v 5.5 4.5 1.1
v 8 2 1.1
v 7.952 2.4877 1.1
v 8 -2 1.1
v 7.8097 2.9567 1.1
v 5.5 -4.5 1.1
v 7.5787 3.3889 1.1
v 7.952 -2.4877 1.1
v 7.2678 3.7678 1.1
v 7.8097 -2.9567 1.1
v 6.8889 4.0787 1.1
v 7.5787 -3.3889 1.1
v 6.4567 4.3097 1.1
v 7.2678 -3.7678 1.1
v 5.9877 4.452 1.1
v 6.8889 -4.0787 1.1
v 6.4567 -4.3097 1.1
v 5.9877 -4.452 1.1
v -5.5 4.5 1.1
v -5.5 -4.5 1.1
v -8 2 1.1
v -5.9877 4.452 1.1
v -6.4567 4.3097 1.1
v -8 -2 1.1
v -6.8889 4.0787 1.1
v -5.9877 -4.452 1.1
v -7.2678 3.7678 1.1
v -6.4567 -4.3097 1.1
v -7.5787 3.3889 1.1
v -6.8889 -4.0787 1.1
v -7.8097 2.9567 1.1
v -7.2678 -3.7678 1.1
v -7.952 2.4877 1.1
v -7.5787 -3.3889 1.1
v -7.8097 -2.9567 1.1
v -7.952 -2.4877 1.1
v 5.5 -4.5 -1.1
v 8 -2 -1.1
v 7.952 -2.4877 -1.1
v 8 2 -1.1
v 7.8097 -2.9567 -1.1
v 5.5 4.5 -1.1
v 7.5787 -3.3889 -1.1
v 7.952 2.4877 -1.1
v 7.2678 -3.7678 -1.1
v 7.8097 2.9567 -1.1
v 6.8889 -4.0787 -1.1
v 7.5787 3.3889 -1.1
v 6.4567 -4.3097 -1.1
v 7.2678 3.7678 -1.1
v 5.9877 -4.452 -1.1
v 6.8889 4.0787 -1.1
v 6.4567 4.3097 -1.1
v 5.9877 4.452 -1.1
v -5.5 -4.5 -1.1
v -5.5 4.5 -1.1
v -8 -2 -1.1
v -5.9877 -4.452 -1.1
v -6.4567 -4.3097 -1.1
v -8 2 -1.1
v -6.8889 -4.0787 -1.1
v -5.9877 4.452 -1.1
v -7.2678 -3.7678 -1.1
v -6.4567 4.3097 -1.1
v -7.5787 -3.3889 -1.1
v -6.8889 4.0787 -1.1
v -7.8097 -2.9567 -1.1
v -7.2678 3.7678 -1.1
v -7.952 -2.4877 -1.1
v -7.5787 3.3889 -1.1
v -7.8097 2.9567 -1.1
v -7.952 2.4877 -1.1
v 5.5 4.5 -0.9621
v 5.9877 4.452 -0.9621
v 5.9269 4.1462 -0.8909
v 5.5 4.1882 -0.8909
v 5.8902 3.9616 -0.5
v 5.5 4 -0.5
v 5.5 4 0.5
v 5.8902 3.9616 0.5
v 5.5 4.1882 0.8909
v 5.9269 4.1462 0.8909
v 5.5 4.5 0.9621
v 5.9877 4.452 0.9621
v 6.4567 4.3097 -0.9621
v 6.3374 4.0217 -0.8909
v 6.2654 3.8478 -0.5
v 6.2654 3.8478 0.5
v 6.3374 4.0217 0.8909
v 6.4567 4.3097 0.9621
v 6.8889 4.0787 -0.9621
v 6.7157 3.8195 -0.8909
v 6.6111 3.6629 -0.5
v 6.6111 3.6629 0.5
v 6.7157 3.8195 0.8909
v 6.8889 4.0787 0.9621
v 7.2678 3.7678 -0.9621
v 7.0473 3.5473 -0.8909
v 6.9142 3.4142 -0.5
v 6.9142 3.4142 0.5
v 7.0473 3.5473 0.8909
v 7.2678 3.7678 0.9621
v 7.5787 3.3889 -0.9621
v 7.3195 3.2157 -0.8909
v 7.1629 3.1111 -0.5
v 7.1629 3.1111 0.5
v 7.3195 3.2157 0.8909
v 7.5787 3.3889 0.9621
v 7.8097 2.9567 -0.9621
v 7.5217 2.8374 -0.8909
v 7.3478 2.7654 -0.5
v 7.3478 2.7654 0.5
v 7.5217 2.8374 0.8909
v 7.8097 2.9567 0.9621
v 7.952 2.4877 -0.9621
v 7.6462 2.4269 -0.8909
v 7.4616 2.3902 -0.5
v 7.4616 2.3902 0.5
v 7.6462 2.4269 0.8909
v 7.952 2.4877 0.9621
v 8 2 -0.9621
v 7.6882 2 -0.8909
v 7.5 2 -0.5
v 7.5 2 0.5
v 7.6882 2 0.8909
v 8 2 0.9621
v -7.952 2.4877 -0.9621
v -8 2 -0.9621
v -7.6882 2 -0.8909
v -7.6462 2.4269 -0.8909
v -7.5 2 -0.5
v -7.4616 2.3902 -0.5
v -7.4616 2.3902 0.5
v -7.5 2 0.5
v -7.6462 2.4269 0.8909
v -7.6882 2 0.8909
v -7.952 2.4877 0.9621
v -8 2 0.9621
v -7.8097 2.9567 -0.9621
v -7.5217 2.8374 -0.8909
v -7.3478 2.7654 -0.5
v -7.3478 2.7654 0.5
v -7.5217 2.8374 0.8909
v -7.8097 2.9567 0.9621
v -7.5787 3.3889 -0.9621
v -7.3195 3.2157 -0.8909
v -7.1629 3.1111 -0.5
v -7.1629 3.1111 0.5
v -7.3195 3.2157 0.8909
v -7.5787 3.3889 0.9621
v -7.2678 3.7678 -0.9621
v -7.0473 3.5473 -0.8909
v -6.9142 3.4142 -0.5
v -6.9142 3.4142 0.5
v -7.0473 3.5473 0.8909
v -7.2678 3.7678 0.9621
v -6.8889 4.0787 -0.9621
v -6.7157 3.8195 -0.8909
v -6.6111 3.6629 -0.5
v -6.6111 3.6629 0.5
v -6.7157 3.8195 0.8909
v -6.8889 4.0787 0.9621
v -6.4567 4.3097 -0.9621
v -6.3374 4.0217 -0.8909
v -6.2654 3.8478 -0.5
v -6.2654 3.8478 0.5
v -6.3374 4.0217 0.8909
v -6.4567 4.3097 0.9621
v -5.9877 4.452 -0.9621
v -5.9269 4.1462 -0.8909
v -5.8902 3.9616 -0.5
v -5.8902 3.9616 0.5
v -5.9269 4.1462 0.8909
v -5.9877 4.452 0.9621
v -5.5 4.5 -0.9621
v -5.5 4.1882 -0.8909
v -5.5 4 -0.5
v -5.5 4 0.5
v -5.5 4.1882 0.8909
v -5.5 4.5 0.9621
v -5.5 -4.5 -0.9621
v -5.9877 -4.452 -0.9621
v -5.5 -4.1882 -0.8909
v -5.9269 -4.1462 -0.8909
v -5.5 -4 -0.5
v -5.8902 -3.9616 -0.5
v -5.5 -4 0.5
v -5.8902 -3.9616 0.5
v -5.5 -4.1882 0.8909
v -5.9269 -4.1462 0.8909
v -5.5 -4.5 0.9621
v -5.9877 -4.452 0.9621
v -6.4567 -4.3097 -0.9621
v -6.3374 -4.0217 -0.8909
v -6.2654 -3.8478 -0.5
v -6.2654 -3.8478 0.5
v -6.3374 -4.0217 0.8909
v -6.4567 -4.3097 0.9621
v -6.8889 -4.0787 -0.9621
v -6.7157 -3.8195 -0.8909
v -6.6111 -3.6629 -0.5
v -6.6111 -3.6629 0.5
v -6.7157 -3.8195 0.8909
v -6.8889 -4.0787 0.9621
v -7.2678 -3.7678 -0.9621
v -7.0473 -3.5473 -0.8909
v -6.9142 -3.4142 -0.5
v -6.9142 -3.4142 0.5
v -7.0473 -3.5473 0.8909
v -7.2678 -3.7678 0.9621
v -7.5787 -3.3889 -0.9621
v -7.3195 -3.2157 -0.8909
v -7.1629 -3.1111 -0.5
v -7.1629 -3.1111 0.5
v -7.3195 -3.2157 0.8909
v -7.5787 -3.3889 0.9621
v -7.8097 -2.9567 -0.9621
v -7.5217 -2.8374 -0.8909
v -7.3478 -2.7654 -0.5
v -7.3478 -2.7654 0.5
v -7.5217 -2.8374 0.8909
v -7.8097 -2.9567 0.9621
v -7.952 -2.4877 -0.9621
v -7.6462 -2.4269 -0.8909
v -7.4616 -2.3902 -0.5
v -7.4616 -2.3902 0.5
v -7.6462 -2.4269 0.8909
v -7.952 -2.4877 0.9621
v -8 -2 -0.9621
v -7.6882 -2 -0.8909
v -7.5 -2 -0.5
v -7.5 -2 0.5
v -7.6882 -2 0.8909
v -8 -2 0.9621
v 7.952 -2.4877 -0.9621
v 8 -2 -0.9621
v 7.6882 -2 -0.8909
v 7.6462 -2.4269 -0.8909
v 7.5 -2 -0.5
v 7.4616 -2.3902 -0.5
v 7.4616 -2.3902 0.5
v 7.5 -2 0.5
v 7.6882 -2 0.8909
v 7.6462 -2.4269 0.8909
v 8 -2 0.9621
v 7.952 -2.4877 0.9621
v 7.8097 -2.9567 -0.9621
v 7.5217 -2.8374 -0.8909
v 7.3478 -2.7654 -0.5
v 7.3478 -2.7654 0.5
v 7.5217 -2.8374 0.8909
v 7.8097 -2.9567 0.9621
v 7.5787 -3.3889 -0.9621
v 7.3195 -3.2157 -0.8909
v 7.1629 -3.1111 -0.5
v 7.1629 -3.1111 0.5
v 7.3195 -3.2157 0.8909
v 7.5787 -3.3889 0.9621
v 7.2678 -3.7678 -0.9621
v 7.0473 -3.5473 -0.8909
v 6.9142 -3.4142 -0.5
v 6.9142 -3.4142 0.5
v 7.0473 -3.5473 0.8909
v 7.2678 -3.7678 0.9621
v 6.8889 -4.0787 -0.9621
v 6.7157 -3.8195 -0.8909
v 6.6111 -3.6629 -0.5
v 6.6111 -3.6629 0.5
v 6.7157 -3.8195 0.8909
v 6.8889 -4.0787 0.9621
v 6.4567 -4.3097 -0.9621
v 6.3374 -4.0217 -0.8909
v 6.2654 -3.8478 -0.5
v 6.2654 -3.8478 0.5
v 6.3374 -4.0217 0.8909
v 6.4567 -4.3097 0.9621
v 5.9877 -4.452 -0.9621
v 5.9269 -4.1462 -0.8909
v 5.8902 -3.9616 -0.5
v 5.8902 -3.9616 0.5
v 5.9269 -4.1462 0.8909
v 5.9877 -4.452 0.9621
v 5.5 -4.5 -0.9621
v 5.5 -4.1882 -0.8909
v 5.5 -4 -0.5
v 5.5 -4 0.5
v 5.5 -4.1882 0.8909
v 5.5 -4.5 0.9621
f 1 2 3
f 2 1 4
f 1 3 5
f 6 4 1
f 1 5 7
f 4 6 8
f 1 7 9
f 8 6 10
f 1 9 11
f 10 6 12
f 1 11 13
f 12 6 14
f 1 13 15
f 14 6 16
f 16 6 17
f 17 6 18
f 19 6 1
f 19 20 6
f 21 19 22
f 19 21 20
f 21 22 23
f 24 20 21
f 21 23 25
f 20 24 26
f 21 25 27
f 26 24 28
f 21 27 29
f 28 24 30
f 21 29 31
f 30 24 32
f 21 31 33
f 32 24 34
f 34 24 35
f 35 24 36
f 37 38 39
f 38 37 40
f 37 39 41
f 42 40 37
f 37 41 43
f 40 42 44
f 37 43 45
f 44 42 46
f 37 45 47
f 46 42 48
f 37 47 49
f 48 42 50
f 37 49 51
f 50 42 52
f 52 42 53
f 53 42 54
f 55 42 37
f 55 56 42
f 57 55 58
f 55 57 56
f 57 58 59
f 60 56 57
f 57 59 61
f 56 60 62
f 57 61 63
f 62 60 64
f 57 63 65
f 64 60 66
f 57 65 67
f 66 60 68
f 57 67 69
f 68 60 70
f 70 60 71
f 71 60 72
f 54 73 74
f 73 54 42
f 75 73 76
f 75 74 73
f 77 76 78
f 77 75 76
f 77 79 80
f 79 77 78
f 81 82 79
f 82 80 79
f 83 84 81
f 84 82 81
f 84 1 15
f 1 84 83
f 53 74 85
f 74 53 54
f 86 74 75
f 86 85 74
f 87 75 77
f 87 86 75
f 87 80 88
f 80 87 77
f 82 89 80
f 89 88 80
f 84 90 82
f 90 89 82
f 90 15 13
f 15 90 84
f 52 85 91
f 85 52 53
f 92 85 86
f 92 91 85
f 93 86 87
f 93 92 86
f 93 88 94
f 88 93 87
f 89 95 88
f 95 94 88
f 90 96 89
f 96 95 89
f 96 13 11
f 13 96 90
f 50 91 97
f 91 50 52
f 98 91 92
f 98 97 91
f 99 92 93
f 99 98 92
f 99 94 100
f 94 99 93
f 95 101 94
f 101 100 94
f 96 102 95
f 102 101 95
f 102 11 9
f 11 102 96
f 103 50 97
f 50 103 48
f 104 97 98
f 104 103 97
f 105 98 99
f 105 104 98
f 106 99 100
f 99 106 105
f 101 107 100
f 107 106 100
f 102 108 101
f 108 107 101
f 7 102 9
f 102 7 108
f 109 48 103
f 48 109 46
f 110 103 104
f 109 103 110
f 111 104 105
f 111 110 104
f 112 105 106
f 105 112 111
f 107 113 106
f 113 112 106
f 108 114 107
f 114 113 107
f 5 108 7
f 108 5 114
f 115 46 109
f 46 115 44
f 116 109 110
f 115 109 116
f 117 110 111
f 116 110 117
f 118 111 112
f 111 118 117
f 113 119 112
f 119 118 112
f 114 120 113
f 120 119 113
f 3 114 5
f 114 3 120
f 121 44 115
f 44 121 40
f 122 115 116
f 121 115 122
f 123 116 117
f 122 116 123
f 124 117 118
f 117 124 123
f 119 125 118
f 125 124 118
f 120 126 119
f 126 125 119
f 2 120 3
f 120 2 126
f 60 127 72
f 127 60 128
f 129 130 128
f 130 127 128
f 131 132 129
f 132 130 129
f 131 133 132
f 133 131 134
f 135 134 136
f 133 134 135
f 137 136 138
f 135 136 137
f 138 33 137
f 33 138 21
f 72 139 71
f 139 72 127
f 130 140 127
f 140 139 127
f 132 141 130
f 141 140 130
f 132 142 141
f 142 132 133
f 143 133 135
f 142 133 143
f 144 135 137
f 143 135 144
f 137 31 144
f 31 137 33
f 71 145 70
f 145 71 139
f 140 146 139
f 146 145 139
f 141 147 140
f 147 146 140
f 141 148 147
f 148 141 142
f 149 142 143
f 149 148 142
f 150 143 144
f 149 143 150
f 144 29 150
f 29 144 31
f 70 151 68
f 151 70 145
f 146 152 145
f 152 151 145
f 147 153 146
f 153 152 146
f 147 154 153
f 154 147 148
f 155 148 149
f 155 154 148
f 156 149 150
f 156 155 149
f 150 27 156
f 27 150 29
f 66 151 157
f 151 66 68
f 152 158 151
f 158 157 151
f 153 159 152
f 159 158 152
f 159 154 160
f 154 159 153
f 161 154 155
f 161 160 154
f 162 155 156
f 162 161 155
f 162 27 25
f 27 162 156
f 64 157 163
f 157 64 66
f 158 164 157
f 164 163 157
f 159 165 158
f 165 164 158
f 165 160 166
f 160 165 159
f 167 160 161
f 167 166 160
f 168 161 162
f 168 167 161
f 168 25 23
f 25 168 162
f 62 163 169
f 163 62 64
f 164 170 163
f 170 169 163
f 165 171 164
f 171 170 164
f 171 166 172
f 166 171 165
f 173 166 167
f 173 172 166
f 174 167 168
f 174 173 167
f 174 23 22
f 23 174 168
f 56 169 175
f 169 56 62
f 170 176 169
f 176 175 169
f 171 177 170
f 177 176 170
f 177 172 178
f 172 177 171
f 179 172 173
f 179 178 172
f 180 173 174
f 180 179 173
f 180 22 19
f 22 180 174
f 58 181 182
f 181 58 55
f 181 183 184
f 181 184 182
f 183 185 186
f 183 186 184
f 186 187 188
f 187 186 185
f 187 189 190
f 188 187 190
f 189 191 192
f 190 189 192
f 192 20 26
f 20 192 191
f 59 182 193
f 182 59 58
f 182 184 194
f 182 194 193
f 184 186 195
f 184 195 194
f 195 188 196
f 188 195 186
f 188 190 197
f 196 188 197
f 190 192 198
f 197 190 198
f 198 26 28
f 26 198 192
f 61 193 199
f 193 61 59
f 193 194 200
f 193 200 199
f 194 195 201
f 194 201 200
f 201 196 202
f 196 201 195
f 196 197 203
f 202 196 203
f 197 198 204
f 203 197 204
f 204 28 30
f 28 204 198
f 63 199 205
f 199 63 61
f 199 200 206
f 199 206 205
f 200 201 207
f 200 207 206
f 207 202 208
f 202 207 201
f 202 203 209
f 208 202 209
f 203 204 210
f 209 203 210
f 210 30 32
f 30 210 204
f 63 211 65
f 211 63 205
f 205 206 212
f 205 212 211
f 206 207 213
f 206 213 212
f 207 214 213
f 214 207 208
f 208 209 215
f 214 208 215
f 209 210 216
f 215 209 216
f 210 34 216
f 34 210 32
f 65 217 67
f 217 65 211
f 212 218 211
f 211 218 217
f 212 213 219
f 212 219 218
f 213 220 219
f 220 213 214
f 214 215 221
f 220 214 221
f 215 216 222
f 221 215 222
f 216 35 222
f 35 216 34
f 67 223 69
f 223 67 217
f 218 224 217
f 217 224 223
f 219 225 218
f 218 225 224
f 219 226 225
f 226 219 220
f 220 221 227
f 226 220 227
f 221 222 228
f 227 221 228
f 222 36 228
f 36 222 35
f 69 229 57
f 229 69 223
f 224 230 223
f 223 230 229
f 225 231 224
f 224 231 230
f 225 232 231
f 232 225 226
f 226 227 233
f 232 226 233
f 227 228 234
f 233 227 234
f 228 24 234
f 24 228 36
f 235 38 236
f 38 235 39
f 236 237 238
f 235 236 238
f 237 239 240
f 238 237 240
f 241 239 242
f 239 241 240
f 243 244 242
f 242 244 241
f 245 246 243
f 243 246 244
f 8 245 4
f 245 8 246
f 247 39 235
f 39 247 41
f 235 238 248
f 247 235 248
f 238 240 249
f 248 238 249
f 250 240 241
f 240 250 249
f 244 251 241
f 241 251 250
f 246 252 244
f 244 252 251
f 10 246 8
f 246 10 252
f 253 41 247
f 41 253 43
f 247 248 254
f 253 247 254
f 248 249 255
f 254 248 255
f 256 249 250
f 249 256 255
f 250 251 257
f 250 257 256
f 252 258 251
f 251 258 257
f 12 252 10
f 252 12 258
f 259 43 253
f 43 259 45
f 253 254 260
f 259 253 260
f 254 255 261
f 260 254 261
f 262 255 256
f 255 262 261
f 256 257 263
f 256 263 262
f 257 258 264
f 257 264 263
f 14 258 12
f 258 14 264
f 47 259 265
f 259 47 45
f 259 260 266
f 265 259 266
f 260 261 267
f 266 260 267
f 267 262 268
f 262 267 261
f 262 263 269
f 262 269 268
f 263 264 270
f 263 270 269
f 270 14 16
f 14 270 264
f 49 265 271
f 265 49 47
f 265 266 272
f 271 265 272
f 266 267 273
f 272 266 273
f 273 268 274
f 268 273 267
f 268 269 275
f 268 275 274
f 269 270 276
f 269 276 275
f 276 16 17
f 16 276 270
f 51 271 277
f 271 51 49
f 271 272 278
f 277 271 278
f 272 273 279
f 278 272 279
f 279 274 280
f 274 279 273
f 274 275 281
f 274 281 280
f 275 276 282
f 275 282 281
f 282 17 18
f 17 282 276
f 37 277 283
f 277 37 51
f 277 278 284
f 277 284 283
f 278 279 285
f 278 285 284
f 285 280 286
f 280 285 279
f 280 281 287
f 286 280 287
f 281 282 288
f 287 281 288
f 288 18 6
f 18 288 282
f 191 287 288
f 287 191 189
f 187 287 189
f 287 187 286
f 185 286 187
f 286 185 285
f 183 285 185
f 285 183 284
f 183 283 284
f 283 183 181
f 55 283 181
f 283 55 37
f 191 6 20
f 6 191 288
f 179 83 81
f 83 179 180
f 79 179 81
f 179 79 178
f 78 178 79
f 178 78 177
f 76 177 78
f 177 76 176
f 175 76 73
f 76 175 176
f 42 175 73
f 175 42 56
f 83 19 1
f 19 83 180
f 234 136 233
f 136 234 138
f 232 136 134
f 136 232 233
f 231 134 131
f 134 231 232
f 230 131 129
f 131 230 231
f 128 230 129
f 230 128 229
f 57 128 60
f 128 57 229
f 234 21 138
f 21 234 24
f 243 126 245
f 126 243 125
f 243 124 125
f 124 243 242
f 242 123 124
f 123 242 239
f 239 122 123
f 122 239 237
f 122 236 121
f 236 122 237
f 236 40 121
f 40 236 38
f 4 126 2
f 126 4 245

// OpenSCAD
/* A cutter to produce a filleted removal in a side

Cutter produces is in the x-y plane and centres, so it will need to be rotated and translated for use (translate to the centre of the aperture and the centre of the thickness)

If the end of the aperture is oval with no flat bit, set r1 to half the smaller aperture dimension

*/

/* [rendering parameters] */
// default minimum facet angle is now 0.5
$fa=0.5; // [0:0.1:1]

// default minimum facet size is now 0.5 mm
$fs=0.5; // [0,0.1,0.5,2,10]


/* [General Parameters] */

// Size of the hole being cut
apertureSize=[15,8];

// Thickness of the material being cut through
thickness=2;

// Radius of the fillet around the cut
r1=2;

// Corner radius of a hole being cut
r2=0.5;

//Safety parameter
overlap=0.1;

cutter(apertureSize,r1,r2,thickness,overlap);

module cutter(apertureSize,r1,r2,thickness,overlap)
{
    union()
    {
        translate([apertureSize[0]/2-r1,apertureSize[1]/2-r1,0])
        {
            torus(apertureSize,r1,r2,thickness,overlap);
        }
        translate([-apertureSize[0]/2+r1,apertureSize[1]/2-r1,0])
        {
            torus(apertureSize,r1,r2,thickness,overlap);
        }
        translate([-apertureSize[0]/2+r1,-apertureSize[1]/2+r1,0])
        {
            torus(apertureSize,r1,r2,thickness,overlap);
        }
        translate([apertureSize[0]/2-r1,-apertureSize[1]/2+r1,0])
        {
            torus(apertureSize,r1,r2,thickness,overlap);
        }
        translate([-apertureSize[0]/2+r1,-apertureSize[1]/2,0])
        {
            rotate([90,0,90])
            {
                longside(apertureSize,r1,r2,thickness,overlap);
            }
        }
        translate([apertureSize[0]/2-r1,apertureSize[1]/2,0])
        {
            rotate([90,0,-90])
            {
                longside(apertureSize,r1,r2,thickness,overlap);
            }
        }
        translate([-apertureSize[0]/2,apertureSize[1]/2-r1,0])
        {
            rotate([90,0,0])
            {
                shortside(apertureSize,r1,r2,thickness,overlap);
            }
        }translate([+apertureSize[0]/2,-apertureSize[1]/2+r1,0])
        {
            rotate([90,0,180])
            {
                shortside(apertureSize,r1,r2,thickness,overlap);
            }
        }
        
    }
}

module longside(apertureSize,r1,r2,thickness,overlap)
{
    linear_extrude(height=apertureSize[0]-r1-r1)
    {
        union()
        {
            translate([0,-thickness/2-overlap])
            {      
                square([apertureSize[1]/2+overlap,thickness+2*overlap]);
            }
            2Dform(apertureSize,r1,r2,thickness,overlap);
        }
    }
}

module shortside(apertureSize,r1,r2,thickness,overlap)
{
    linear_extrude(height=apertureSize[1]-r1-r1)
    {
        union()
        {
            translate([0,-thickness/2-overlap])
            {      
                square([apertureSize[0]/2+overlap,thickness+2*overlap]);
            }
            2Dform(apertureSize,r1,r2,thickness,overlap);
        }
    }
}

module torus(apertureSize,r1,r2,thickness,overlap)
{
    rotate_extrude(convexity=10)
    {
        translate([-r1,0])
        {
            2Dform(apertureSize,r1,r2,thickness,overlap);
        }
    }
}

module 2Dform(apertureSize,r1,r2,thickness,overlap)
{
    difference()
    {
        translate([-r2,-thickness/2-overlap])
        {   
            square([r2+r1,thickness+2*overlap]);
        }
        nibbler(apertureSize,r1,r2,thickness,overlap);
    }
}

module nibbler(apertureSize,r1,r2,thickness,overlap)
{
    union()
    {
        translate([-r2-overlap,-thickness/2+r2])
        {
            square([r2+overlap,thickness-2*r2]);
        }
        translate([-r2,thickness/2-r2])
        {
            circle(r=r2);
        }
        translate([-r2,-thickness/2+r2])
        {
            circle(r=r2);
        }
    }
}
